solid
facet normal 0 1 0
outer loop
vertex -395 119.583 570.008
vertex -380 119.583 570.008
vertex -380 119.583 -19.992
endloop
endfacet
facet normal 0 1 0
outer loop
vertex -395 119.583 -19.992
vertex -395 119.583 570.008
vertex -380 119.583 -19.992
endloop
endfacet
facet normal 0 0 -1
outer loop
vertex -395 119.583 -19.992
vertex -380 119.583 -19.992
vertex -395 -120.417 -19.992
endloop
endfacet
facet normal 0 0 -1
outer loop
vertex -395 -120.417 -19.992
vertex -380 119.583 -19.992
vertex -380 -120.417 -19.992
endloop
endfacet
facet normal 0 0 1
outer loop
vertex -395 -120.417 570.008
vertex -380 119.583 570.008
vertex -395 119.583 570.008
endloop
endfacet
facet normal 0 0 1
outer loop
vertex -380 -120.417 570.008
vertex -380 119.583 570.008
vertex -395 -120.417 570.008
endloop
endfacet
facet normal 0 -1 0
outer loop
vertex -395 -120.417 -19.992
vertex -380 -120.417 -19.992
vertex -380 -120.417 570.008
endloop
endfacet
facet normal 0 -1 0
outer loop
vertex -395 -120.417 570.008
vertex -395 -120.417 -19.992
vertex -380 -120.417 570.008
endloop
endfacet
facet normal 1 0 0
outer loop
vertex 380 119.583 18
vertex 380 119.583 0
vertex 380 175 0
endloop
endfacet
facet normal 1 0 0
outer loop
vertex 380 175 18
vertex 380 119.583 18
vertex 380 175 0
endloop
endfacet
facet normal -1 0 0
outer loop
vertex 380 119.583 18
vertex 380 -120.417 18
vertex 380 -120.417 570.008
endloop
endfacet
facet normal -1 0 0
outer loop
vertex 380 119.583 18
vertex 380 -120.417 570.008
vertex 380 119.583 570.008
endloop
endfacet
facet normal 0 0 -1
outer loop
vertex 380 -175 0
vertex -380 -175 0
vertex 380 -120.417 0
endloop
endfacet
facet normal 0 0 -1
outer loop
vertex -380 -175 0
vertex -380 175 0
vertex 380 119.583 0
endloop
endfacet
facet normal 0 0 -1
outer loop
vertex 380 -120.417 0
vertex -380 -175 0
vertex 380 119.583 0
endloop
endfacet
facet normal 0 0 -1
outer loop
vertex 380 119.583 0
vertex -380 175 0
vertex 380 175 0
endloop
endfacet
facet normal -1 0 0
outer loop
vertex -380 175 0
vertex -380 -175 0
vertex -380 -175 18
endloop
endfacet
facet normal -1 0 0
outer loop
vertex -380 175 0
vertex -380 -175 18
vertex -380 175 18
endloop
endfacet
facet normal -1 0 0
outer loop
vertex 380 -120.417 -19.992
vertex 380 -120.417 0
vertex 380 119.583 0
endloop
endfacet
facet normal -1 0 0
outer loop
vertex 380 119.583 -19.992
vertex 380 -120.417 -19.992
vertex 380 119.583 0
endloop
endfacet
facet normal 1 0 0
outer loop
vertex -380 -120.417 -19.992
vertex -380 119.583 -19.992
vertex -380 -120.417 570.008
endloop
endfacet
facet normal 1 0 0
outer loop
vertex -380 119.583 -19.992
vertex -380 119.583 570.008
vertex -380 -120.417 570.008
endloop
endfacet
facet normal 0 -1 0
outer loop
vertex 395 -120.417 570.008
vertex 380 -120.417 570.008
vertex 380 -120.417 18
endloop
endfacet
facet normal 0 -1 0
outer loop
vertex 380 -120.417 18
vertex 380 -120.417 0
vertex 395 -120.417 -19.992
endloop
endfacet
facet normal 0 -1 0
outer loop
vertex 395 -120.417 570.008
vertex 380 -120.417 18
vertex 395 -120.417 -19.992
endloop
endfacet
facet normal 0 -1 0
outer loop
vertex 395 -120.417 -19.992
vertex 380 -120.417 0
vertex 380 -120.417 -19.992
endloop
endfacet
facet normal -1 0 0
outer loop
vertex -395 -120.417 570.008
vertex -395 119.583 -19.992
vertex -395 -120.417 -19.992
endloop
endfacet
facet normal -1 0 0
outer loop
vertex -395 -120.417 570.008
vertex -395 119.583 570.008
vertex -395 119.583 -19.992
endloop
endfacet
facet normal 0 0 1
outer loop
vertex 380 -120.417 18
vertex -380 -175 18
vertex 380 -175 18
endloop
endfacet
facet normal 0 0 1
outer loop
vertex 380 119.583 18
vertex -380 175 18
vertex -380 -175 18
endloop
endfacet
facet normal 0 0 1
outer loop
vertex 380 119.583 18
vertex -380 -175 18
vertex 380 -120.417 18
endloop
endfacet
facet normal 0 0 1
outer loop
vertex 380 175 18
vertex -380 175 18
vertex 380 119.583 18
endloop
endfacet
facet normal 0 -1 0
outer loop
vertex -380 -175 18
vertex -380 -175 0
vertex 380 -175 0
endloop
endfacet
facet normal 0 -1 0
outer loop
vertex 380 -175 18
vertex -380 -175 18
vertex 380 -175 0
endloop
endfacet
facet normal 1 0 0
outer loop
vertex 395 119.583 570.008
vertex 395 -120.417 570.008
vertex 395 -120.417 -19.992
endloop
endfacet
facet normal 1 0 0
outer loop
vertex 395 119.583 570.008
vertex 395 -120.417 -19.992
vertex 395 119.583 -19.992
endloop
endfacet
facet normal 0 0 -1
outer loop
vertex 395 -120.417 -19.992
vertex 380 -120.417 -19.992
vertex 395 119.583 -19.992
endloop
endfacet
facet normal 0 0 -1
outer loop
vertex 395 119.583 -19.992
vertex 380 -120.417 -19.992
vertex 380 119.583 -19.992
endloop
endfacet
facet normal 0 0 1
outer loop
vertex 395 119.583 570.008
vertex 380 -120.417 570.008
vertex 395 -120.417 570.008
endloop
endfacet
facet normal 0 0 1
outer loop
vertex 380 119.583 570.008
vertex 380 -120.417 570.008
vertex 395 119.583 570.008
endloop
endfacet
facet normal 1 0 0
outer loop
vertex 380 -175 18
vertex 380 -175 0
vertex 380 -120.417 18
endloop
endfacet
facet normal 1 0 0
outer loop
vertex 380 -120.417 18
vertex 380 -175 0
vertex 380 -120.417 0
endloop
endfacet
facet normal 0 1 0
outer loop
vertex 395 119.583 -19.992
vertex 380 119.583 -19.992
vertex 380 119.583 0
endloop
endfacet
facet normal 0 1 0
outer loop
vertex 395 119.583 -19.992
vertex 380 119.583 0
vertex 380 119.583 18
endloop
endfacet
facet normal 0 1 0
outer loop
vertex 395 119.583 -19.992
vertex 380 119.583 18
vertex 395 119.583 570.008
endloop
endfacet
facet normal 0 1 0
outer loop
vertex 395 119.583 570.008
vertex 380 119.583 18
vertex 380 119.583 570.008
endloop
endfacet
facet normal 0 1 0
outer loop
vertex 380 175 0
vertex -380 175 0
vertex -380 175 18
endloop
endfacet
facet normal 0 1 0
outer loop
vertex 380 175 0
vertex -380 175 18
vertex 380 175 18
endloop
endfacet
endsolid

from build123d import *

# Parameters (mm, degrees)
F0_W     = 760
F0_H     = 350
F1_DEPTH = 18
F2_W     = 240
F2_H     = 19.9916773911
F2_H_2   = 18
F2_H_3   = 552.0083226089
F3_DEPTH = 15
F4_W     = 240
F4_H     = 552.0083226089
F4_H_2   = 18
F4_H_3   = 19.9916773911
F5_DEPTH = 15


with BuildPart() as f1:
    # F0 (on Top) → F1 (new body)
    with BuildSketch(Plane.XY):
        Rectangle(F0_W, F0_H)
    extrude(amount=F1_DEPTH)

    # F4 (on face) → F5 (join)
    with BuildSketch(Plane.YZ.offset(380)):
        with Locations((-0.4170164466, 294.0041613045)):
            Rectangle(F4_W, F4_H)
        with Locations((-0.4170164466, 9)):
            Rectangle(F4_W, F4_H_2)
        with Locations((-0.4170164466, -9.9958386955)):
            Rectangle(F4_W, F4_H_3)
    extrude(amount=F5_DEPTH)


with BuildPart() as f3:
    # F2 (on face) → F3 (new body)
    with BuildSketch(Plane(origin=(-380, 0, 0), x_dir=(0, -1, 0), z_dir=(-1, 0, 0))):
        with Locations((0.4170164466, -9.9958386955)):
            Rectangle(F2_W, F2_H)
        with Locations((0.4170164466, 9)):
            Rectangle(F2_W, F2_H_2)
        with Locations((0.4170164466, 294.0041613045)):
            Rectangle(F2_W, F2_H_3)
    extrude(amount=F3_DEPTH)


solid = Compound([f1.part, f3.part])
